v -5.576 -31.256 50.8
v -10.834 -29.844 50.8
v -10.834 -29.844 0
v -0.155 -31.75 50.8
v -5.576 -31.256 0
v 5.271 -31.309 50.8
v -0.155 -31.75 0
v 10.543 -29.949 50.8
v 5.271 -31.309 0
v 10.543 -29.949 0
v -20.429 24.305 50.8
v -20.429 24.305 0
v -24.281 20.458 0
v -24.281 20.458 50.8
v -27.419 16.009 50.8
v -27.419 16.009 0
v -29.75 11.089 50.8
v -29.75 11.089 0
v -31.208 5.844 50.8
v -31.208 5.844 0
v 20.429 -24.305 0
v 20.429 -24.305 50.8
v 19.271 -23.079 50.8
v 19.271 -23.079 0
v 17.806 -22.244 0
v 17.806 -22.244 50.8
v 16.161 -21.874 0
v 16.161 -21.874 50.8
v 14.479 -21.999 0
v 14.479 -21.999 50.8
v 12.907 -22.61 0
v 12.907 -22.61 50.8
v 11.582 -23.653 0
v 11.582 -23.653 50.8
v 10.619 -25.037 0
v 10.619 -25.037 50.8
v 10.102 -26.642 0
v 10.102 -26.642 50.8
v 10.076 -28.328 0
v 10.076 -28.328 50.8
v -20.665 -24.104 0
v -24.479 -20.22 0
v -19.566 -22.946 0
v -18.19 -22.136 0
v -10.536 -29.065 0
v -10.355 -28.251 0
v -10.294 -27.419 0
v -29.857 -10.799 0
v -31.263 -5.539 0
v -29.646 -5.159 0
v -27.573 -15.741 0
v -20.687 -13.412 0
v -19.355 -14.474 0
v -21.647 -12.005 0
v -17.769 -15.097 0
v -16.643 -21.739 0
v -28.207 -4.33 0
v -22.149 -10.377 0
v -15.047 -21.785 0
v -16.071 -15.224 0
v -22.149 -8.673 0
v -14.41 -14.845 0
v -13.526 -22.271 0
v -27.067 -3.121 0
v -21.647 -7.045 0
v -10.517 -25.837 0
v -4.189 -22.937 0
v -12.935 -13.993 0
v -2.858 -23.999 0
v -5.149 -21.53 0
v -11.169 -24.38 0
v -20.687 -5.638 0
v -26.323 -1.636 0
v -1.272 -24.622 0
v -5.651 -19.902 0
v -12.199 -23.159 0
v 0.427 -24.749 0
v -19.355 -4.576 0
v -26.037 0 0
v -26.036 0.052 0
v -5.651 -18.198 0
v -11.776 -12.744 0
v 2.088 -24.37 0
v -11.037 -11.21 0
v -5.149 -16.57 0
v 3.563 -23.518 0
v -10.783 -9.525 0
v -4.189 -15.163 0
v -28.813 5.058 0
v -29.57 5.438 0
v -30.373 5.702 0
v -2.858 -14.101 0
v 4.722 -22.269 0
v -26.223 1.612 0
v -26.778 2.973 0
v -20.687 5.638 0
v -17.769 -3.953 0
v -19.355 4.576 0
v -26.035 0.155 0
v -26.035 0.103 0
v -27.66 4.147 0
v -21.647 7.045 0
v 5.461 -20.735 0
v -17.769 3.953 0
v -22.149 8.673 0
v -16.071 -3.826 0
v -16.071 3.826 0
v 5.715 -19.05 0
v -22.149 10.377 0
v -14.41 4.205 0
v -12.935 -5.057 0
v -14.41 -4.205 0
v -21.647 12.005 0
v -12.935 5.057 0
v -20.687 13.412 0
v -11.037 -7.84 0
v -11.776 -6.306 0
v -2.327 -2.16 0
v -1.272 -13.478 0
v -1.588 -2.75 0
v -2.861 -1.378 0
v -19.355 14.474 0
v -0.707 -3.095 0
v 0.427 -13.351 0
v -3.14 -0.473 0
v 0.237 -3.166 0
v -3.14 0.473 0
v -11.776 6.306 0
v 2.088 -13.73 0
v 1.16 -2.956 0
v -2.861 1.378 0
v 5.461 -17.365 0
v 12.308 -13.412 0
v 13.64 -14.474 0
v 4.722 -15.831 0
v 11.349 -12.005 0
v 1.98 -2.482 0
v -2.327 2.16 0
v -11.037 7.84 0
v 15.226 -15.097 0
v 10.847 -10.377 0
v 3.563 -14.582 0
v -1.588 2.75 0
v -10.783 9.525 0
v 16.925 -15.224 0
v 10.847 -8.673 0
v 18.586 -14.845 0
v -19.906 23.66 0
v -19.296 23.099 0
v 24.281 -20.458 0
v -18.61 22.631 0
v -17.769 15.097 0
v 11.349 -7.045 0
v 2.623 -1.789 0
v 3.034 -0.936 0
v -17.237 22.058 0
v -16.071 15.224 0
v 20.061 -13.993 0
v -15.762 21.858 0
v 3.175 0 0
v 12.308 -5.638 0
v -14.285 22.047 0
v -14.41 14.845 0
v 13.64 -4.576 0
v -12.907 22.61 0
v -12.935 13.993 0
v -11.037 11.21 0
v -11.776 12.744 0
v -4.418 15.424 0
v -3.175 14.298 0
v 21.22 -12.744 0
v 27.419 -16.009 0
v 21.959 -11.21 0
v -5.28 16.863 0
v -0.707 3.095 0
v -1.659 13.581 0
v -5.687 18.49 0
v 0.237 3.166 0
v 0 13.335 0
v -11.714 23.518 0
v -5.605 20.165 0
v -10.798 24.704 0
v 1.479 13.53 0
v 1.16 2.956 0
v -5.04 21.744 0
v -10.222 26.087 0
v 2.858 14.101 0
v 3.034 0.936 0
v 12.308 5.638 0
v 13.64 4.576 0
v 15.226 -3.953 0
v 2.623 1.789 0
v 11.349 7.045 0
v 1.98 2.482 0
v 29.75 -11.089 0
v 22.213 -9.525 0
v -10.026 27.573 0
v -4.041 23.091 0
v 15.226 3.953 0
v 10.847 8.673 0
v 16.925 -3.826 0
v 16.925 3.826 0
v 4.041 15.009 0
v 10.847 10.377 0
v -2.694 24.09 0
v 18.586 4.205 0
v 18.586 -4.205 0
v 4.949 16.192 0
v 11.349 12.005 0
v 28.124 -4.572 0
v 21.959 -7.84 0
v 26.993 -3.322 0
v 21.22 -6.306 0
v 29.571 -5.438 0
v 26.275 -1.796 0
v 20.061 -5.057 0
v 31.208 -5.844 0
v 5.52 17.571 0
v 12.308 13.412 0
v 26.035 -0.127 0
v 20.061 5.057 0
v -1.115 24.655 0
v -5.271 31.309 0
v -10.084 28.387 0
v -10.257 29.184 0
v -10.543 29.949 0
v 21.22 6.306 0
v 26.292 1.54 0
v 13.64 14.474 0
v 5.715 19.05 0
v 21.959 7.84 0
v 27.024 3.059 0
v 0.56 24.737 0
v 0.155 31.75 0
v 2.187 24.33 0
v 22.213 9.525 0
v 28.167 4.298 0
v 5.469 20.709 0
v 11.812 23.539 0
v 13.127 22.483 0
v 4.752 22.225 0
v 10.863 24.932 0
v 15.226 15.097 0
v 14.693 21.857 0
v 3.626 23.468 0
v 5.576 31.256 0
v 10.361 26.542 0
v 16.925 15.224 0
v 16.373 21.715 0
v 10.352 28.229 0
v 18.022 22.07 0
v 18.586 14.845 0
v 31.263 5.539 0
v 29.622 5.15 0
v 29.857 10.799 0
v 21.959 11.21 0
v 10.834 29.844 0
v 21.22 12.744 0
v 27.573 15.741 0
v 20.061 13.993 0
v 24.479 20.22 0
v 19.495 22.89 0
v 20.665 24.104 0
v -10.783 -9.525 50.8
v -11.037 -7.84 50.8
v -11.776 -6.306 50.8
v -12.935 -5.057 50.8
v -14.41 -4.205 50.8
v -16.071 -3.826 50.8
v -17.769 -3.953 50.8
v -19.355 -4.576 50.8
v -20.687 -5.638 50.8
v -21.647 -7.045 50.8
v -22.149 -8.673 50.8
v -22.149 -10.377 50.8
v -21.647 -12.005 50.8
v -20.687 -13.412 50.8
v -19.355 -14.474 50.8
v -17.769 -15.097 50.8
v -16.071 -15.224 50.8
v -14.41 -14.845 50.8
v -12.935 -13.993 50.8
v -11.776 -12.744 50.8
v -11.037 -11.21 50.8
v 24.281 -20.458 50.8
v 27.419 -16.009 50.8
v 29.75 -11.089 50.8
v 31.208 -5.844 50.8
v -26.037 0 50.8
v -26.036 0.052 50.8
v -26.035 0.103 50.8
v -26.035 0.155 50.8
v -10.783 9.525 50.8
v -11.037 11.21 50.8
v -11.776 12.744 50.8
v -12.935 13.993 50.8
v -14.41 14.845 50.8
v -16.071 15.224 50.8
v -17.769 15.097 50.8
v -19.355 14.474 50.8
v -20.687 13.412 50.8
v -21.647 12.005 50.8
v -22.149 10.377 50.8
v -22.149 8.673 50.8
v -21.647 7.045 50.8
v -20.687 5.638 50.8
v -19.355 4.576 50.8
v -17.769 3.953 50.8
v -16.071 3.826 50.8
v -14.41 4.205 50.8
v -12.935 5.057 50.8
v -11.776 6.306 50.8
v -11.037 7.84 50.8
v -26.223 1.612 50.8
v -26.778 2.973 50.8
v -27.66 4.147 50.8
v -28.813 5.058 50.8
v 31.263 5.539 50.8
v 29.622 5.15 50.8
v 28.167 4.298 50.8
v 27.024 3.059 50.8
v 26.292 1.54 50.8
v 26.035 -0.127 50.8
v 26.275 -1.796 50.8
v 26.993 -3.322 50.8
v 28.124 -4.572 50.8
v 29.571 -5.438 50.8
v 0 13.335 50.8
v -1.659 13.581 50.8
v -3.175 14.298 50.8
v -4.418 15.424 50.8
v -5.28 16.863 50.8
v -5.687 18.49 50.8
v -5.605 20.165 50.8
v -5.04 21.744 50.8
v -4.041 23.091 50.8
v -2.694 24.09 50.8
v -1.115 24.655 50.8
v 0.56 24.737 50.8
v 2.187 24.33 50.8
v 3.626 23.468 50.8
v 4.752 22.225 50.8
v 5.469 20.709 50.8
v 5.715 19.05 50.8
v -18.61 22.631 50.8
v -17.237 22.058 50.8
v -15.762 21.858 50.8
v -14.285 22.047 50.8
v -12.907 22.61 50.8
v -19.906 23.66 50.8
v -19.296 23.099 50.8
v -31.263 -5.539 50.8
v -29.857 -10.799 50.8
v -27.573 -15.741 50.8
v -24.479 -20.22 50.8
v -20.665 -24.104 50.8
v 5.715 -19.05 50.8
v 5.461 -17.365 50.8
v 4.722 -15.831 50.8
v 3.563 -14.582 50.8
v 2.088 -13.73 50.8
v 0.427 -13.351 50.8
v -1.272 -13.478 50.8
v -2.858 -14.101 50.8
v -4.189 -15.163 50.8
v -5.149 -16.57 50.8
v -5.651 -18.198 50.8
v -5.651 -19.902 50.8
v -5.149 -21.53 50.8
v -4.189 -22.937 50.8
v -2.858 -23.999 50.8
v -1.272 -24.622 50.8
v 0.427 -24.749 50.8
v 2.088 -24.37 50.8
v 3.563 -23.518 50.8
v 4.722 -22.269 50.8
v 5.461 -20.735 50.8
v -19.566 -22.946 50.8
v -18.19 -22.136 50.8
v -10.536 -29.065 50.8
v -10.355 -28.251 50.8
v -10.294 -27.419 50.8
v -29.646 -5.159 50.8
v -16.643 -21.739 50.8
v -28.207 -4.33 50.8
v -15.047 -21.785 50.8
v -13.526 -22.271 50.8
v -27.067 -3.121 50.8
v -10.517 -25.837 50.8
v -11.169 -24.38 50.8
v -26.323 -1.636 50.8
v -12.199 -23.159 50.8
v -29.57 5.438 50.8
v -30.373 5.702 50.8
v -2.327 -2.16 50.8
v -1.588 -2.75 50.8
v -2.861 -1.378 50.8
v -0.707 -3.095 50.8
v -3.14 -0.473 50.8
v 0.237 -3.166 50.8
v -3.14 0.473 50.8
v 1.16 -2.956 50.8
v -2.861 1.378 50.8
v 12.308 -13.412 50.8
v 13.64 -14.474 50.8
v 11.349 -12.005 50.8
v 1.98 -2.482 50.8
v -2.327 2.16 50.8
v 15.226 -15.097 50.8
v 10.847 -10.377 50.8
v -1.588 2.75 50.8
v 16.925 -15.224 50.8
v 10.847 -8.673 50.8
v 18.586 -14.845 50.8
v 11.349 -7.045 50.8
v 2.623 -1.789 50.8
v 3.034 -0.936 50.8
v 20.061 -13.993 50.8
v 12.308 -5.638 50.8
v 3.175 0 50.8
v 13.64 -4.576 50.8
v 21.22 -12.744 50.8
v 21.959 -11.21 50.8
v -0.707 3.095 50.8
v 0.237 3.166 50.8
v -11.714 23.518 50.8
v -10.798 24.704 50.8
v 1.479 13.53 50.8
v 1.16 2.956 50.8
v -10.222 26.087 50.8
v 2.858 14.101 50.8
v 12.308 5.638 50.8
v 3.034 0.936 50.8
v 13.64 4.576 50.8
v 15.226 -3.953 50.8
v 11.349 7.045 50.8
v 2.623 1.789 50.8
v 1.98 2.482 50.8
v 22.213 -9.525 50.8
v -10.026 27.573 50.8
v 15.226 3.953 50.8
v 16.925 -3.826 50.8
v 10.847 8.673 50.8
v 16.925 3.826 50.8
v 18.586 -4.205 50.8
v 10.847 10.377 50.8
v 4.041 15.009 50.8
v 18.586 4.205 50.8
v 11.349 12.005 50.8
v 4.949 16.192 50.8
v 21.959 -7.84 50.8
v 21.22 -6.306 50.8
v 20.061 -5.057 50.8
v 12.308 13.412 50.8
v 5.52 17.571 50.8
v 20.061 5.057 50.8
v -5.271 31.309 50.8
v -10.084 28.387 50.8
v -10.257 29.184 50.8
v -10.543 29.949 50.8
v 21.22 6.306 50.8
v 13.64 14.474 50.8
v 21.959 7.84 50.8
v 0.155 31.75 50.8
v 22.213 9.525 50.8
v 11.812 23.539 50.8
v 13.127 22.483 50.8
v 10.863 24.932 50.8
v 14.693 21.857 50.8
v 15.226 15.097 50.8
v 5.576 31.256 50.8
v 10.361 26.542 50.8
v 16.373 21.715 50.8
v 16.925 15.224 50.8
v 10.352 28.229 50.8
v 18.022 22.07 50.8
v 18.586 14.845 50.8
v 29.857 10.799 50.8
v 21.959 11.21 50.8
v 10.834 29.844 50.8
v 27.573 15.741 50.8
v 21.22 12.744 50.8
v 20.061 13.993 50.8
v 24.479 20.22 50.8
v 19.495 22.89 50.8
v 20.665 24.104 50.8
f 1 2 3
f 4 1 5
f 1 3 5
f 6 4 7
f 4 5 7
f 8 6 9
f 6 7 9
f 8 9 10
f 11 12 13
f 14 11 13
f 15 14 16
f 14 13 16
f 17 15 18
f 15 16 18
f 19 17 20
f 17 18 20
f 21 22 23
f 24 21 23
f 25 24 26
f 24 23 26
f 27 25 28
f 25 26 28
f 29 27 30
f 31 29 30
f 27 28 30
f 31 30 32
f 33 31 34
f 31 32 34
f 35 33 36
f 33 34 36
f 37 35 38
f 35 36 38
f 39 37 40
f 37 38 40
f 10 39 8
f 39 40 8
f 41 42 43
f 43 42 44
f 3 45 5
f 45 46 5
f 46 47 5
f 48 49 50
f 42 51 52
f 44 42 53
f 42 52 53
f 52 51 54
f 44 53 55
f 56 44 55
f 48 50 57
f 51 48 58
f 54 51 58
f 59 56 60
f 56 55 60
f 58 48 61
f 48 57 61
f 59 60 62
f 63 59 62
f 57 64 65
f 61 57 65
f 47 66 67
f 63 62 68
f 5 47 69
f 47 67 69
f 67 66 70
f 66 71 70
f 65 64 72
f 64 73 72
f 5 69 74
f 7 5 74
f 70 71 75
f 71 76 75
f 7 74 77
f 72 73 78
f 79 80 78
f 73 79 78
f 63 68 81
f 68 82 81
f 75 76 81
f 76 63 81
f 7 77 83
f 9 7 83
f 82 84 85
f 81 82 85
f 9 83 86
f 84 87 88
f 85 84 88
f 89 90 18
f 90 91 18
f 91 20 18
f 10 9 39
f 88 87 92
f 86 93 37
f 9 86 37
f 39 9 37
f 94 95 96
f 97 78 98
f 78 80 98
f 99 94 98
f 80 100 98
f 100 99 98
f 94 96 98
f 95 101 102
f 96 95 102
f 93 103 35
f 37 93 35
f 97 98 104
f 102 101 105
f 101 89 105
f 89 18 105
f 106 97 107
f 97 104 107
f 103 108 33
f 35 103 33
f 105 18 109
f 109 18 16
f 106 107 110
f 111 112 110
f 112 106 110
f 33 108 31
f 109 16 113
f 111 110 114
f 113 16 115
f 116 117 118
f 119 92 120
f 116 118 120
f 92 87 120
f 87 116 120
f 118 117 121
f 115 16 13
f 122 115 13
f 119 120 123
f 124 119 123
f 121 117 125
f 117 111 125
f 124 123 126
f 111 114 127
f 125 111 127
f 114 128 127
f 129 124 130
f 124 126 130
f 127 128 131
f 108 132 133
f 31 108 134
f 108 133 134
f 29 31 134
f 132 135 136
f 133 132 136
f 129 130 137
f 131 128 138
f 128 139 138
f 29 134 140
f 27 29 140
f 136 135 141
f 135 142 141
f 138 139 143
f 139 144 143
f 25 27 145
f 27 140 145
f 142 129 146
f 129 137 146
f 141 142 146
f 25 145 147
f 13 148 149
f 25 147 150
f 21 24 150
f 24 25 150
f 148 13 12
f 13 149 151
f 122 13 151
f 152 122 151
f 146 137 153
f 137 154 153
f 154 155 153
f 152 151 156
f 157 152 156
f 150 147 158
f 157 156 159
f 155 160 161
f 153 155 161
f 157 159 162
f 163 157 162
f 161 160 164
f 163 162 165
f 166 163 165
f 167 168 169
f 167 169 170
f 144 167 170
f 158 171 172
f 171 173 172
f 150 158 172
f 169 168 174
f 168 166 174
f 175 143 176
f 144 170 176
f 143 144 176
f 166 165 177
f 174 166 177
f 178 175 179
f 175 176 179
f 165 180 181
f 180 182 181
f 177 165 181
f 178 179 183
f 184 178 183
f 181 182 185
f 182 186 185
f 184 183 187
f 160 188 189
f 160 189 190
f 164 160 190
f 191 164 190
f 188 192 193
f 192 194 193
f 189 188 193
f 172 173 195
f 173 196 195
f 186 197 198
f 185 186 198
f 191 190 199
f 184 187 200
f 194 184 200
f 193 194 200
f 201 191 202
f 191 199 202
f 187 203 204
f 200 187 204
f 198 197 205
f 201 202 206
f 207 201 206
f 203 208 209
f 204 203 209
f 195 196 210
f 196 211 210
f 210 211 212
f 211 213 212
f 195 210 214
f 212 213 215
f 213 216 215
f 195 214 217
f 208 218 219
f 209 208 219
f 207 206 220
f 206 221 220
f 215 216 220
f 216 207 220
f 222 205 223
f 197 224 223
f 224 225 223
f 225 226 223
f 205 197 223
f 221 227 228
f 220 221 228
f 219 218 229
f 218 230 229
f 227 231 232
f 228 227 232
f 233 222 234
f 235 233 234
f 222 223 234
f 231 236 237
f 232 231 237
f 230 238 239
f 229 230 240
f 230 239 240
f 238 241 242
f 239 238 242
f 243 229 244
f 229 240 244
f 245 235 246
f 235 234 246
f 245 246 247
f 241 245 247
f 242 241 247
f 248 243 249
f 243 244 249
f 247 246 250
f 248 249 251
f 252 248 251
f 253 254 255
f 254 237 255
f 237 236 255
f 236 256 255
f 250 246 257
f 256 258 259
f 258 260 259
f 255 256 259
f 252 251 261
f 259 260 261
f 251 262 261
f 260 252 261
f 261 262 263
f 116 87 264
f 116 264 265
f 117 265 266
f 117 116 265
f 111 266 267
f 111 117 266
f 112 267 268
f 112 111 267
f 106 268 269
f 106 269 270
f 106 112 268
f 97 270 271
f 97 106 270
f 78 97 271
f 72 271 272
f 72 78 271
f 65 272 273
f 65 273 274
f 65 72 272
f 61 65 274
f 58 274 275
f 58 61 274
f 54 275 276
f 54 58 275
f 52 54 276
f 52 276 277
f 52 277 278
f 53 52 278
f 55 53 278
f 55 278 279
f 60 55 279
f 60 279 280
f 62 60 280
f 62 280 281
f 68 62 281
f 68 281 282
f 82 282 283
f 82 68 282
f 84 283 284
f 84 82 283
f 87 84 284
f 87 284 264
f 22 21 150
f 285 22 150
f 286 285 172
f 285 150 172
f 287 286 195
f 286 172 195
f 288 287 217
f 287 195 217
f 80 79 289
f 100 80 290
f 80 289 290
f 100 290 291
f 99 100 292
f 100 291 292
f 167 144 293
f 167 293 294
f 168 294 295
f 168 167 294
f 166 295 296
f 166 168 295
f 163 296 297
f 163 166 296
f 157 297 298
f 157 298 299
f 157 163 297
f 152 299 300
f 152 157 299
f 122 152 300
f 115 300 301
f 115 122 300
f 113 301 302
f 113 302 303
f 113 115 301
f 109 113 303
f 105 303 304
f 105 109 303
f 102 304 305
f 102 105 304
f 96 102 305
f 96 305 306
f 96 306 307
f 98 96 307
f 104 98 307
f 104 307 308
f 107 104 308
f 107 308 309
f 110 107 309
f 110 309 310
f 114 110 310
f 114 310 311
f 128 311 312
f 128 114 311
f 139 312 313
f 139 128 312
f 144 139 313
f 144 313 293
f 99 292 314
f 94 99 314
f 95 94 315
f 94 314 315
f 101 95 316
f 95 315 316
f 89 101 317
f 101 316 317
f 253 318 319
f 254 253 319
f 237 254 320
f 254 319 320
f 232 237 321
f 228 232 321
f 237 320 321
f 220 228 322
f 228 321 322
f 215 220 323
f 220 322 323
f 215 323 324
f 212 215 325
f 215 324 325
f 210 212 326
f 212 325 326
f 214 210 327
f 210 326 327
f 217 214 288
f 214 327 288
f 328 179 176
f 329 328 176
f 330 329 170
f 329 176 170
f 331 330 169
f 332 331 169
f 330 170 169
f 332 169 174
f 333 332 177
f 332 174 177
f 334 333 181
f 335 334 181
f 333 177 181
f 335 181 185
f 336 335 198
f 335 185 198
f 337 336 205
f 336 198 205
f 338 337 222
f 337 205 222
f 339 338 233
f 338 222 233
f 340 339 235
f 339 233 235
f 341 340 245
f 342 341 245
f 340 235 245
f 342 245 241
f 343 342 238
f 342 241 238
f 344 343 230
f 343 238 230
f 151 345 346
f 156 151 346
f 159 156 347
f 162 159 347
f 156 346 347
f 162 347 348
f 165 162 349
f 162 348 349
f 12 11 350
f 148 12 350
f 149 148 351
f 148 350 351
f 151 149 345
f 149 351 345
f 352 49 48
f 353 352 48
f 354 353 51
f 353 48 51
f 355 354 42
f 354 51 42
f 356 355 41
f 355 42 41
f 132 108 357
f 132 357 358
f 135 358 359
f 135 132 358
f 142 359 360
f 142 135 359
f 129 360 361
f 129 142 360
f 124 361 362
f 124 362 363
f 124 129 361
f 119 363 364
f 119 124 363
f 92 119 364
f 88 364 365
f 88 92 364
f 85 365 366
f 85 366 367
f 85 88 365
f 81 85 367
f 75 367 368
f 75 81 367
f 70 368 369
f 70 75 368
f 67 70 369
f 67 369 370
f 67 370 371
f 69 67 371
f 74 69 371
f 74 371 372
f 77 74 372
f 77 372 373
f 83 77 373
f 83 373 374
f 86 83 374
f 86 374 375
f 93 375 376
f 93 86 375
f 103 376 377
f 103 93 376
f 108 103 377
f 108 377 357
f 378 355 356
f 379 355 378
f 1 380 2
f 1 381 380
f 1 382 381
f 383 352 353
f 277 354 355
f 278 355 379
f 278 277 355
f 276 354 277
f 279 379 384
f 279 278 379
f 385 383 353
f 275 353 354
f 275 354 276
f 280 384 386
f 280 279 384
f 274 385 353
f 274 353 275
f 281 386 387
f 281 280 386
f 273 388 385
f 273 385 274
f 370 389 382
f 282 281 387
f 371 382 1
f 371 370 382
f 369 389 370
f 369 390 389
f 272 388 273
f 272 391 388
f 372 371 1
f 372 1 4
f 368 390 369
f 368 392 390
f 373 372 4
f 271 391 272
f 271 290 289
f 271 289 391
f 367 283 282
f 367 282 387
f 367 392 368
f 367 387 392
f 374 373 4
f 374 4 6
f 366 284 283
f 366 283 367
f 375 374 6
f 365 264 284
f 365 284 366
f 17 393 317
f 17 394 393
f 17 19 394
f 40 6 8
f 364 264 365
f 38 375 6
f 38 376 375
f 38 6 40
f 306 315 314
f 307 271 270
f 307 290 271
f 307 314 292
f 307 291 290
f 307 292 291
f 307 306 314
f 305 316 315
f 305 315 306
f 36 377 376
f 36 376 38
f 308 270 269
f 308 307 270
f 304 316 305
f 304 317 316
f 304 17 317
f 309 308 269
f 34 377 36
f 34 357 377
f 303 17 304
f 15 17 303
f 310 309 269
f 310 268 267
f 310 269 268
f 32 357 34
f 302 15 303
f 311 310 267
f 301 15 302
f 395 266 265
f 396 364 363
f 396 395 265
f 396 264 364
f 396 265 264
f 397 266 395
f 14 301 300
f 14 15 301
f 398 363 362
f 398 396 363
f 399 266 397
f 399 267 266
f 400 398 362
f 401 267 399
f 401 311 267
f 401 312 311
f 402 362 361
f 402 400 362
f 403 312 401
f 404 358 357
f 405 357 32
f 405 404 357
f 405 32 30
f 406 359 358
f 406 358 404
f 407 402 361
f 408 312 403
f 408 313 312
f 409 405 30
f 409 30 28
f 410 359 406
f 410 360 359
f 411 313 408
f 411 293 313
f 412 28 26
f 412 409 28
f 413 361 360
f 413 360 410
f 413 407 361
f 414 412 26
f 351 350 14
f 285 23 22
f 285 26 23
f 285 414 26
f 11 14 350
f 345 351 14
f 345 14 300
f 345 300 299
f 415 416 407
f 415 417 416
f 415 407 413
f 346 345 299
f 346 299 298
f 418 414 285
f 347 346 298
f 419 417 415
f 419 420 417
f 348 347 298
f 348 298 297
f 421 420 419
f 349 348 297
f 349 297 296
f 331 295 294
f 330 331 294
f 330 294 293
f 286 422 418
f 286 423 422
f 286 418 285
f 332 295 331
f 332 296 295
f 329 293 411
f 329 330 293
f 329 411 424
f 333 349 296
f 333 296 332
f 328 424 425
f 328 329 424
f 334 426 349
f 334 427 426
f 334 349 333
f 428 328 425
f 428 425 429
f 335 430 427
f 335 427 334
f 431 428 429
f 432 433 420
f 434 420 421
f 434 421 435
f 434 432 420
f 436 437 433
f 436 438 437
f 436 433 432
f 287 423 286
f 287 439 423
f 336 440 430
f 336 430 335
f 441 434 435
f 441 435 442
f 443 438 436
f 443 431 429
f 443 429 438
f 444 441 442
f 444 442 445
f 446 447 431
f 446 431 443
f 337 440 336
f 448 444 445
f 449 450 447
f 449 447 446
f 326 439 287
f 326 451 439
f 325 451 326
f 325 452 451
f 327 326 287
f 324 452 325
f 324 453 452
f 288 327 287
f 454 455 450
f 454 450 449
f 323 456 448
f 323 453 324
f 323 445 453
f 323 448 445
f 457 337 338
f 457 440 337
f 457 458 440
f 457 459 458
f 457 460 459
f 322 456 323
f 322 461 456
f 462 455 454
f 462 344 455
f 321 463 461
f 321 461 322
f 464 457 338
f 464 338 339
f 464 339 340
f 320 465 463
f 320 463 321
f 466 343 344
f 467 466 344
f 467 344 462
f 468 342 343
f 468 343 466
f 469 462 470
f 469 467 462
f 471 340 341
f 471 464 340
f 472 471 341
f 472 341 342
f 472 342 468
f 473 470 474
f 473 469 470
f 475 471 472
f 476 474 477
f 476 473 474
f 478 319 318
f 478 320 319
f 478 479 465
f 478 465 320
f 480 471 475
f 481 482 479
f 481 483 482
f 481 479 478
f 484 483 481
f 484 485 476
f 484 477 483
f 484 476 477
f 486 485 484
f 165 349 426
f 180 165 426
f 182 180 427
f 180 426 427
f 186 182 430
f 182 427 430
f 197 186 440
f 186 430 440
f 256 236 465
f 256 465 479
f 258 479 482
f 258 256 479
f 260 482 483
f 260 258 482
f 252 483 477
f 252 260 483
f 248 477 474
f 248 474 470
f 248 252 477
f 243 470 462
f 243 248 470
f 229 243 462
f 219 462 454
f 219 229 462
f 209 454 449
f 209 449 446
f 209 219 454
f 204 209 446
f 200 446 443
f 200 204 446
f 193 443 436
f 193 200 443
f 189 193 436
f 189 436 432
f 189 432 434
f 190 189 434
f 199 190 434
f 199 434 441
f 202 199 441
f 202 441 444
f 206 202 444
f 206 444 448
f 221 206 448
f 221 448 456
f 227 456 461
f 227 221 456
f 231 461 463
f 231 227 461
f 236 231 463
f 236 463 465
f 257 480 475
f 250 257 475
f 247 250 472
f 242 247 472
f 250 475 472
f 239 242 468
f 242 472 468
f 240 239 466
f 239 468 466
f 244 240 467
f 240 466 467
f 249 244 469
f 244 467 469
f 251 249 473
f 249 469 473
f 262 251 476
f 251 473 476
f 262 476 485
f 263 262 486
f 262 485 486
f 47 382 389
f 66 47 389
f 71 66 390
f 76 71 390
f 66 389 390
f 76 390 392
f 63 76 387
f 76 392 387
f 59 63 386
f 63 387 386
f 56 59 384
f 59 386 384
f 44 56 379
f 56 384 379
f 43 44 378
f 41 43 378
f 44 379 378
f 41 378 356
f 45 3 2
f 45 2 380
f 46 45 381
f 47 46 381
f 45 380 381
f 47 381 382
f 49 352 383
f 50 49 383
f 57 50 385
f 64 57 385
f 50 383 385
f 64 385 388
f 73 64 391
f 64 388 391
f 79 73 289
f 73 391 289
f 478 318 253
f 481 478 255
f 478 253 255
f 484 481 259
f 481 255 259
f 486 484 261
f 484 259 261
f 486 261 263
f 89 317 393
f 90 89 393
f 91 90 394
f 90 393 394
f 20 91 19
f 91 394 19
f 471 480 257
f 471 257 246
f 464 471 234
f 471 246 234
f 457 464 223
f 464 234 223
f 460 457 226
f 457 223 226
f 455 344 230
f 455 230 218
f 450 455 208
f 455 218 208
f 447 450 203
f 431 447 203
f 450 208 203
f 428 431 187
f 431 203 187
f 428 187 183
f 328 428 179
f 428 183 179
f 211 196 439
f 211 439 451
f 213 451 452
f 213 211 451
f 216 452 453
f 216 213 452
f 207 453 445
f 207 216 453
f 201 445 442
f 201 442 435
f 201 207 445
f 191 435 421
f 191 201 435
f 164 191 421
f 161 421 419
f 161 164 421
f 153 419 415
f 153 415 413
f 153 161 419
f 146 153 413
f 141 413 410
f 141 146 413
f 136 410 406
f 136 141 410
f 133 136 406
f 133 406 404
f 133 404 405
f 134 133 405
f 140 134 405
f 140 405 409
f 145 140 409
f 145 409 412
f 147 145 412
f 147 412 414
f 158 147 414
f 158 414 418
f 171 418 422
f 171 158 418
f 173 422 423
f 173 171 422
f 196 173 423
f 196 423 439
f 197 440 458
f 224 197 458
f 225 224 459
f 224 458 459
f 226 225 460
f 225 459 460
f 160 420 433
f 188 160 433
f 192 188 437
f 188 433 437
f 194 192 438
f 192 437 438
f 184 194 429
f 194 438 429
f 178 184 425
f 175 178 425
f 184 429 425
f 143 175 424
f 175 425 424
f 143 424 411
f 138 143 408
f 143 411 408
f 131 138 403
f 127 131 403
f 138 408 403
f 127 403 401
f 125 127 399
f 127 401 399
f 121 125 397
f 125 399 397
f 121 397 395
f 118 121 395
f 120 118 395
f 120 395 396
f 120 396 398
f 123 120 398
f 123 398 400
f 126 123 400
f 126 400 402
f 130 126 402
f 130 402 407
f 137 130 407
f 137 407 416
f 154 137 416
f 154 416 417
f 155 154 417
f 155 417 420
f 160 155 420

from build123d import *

# Parameters (mm, degrees)
F0_R     = 31.75
F0_R_2   = 5.715
F1_DEPTH = 50.8
F3_DEPTH = 76.2
F4_R     = 3.175
F5_DEPTH = 76.2


with BuildPart() as f1:
    # F0 (on Top) → F1 (new body)
    with BuildSketch(Plane.XY):
        Circle(F0_R)
        with Locations((-16.4977839421, -9.525)):
            Circle(F0_R_2, mode=Mode.SUBTRACT)
        with Locations((0, -19.05)):
            Circle(F0_R_2, mode=Mode.SUBTRACT)
        with Locations((16.4977839421, -9.525)):
            Circle(F0_R_2, mode=Mode.SUBTRACT)
        with Locations((-16.4977839421, 9.525)):
            Circle(F0_R_2, mode=Mode.SUBTRACT)
        with Locations((16.4977839421, 9.525)):
            Circle(F0_R_2, mode=Mode.SUBTRACT)
        with BuildLine():
            ThreePointArc((0, 13.335), (-4.0411152545, 23.0911152545), (5.715, 19.05))
            ThreePointArc((5.715, 19.05), (4.0411152545, 15.0088847455), (0, 13.335))
        make_face(mode=Mode.SUBTRACT)
    extrude(amount=F1_DEPTH)

    # F2 (on face) → F3 (cut)
    with BuildSketch(Plane.XY.offset(50.8)):
        with BuildLine():
            ThreePointArc((21.7238685359, 27.4185818051), (17.2514556231, 32.9968613186), (10.8342089276, 29.8443029222))
            ThreePointArc((10.8342089276, 29.8443029222), (16.0088685359, 27.4185818051), (20.6648408036, 24.1044986374))
            ThreePointArc((20.6648408036, 24.1044986374), (21.4526772444, 25.6789922716), (21.7238685359, 27.4185818051))
        make_face()
        with BuildLine():
            ThreePointArc((20.6648408036, 24.1044986374), (16.0088685359, 27.4185818051), (10.8342089276, 29.8443029222))
            ThreePointArc((10.8342089276, 29.8443029222), (13.1272721994, 22.4832370801), (20.6648408036, 24.1044986374))
        make_face()
        with BuildLine():
            Line((-15.740754111, 27.5733777405), (-12.907418371, 22.6101697472))
            ThreePointArc((-12.907418371, 22.6101697472), (-10.798399472, 24.7038210459), (-10.025754111, 27.5733777405))
            ThreePointArc((-10.025754111, 27.5733777405), (-10.1564827093, 28.7887533666), (-10.5426877637, 29.9485264198))
            ThreePointArc((-10.5426877637, 29.9485264198), (-13.1952704408, 28.8781463739), (-15.740754111, 27.5733777405))
        make_face()
        with BuildLine():
            ThreePointArc((-18.6103108055, 22.6310231015), (-15.7616515985, 21.8584159475), (-12.907418371, 22.6101697472))
            Line((-12.907418371, 22.6101697472), (-15.740754111, 27.5733777405))
            Line((-15.740754111, 27.5733777405), (-18.6103108055, 22.6310231015))
        make_face()
        with BuildLine():
            Line((-18.6103108055, 22.6310231015), (-15.740754111, 27.5733777405))
            ThreePointArc((-15.740754111, 27.5733777405), (-18.1584784341, 26.0448106339), (-20.4288200251, 24.3048516223))
            ThreePointArc((-20.4288200251, 24.3048516223), (-19.6111339829, 23.368453883), (-18.6103108055, 22.6310231015))
        make_face()
        with BuildLine():
            Line((-31.75, 0), (-26.0367194254, 0))
            ThreePointArc((-26.0367194254, 0), (-26.0351468655, 0.0773908676), (-26.0346226469, 0.1547959354))
            ThreePointArc((-26.0346226469, 0.1547959354), (-26.7776126488, 2.9726571064), (-28.8133948529, 5.0578349259))
            Line((-28.8133948529, 5.0578349259), (-31.75, 0))
        make_face()
        with BuildLine():
            ThreePointArc((-31.2630289527, -5.5394512999), (-27.5927222778, -3.7671174142), (-26.0367194254, 0))
            Line((-26.0367194254, 0), (-31.75, 0))
            ThreePointArc((-31.75, 0), (-31.6280229326, -2.7804074119), (-31.2630289527, -5.5394512999))
        make_face()
        with BuildLine():
            ThreePointArc((-31.2075285673, 5.8440277824), (-31.614091257, 2.9345756072), (-31.75, 0))
            Line((-31.75, 0), (-28.8133948529, 5.0578349259))
            ThreePointArc((-28.8133948529, 5.0578349259), (-29.9665899591, 5.5845306834), (-31.2075285673, 5.8440277824))
        make_face()
        with BuildLine():
            ThreePointArc((-10.2938685359, -27.4185818051), (-14.2692790024, -21.9747730965), (-20.6648408036, -24.1044986374))
            ThreePointArc((-20.6648408036, -24.1044986374), (-16.0088685359, -27.4185818051), (-10.8342089276, -29.8443029222))
            ThreePointArc((-10.8342089276, -29.8443029222), (-10.4305890224, -28.6611688923), (-10.2938685359, -27.4185818051))
        make_face()
        with BuildLine():
            ThreePointArc((20.4288200251, -24.3048516223), (12.907418371, -22.6101697472), (10.5426877637, -29.9485264198))
            ThreePointArc((10.5426877637, -29.9485264198), (15.740754111, -27.5733777405), (20.4288200251, -24.3048516223))
        make_face()
        with BuildLine():
            ThreePointArc((31.75, 0), (31.6280229326, 2.7804074119), (31.2630289527, 5.5394512999))
            ThreePointArc((31.2630289527, 5.5394512999), (26.0346905704, -0.126932667), (31.2075285673, -5.8440277824))
            ThreePointArc((31.2075285673, -5.8440277824), (31.614091257, -2.9345756072), (31.75, 0))
        make_face()
    extrude(amount=-F3_DEPTH, mode=Mode.SUBTRACT)

    # F4 (on face) → F5 (cut)
    with BuildSketch(Plane.XY.offset(50.8)):
        Circle(F4_R)
    extrude(amount=-F5_DEPTH, mode=Mode.SUBTRACT)


solid = f1.part
